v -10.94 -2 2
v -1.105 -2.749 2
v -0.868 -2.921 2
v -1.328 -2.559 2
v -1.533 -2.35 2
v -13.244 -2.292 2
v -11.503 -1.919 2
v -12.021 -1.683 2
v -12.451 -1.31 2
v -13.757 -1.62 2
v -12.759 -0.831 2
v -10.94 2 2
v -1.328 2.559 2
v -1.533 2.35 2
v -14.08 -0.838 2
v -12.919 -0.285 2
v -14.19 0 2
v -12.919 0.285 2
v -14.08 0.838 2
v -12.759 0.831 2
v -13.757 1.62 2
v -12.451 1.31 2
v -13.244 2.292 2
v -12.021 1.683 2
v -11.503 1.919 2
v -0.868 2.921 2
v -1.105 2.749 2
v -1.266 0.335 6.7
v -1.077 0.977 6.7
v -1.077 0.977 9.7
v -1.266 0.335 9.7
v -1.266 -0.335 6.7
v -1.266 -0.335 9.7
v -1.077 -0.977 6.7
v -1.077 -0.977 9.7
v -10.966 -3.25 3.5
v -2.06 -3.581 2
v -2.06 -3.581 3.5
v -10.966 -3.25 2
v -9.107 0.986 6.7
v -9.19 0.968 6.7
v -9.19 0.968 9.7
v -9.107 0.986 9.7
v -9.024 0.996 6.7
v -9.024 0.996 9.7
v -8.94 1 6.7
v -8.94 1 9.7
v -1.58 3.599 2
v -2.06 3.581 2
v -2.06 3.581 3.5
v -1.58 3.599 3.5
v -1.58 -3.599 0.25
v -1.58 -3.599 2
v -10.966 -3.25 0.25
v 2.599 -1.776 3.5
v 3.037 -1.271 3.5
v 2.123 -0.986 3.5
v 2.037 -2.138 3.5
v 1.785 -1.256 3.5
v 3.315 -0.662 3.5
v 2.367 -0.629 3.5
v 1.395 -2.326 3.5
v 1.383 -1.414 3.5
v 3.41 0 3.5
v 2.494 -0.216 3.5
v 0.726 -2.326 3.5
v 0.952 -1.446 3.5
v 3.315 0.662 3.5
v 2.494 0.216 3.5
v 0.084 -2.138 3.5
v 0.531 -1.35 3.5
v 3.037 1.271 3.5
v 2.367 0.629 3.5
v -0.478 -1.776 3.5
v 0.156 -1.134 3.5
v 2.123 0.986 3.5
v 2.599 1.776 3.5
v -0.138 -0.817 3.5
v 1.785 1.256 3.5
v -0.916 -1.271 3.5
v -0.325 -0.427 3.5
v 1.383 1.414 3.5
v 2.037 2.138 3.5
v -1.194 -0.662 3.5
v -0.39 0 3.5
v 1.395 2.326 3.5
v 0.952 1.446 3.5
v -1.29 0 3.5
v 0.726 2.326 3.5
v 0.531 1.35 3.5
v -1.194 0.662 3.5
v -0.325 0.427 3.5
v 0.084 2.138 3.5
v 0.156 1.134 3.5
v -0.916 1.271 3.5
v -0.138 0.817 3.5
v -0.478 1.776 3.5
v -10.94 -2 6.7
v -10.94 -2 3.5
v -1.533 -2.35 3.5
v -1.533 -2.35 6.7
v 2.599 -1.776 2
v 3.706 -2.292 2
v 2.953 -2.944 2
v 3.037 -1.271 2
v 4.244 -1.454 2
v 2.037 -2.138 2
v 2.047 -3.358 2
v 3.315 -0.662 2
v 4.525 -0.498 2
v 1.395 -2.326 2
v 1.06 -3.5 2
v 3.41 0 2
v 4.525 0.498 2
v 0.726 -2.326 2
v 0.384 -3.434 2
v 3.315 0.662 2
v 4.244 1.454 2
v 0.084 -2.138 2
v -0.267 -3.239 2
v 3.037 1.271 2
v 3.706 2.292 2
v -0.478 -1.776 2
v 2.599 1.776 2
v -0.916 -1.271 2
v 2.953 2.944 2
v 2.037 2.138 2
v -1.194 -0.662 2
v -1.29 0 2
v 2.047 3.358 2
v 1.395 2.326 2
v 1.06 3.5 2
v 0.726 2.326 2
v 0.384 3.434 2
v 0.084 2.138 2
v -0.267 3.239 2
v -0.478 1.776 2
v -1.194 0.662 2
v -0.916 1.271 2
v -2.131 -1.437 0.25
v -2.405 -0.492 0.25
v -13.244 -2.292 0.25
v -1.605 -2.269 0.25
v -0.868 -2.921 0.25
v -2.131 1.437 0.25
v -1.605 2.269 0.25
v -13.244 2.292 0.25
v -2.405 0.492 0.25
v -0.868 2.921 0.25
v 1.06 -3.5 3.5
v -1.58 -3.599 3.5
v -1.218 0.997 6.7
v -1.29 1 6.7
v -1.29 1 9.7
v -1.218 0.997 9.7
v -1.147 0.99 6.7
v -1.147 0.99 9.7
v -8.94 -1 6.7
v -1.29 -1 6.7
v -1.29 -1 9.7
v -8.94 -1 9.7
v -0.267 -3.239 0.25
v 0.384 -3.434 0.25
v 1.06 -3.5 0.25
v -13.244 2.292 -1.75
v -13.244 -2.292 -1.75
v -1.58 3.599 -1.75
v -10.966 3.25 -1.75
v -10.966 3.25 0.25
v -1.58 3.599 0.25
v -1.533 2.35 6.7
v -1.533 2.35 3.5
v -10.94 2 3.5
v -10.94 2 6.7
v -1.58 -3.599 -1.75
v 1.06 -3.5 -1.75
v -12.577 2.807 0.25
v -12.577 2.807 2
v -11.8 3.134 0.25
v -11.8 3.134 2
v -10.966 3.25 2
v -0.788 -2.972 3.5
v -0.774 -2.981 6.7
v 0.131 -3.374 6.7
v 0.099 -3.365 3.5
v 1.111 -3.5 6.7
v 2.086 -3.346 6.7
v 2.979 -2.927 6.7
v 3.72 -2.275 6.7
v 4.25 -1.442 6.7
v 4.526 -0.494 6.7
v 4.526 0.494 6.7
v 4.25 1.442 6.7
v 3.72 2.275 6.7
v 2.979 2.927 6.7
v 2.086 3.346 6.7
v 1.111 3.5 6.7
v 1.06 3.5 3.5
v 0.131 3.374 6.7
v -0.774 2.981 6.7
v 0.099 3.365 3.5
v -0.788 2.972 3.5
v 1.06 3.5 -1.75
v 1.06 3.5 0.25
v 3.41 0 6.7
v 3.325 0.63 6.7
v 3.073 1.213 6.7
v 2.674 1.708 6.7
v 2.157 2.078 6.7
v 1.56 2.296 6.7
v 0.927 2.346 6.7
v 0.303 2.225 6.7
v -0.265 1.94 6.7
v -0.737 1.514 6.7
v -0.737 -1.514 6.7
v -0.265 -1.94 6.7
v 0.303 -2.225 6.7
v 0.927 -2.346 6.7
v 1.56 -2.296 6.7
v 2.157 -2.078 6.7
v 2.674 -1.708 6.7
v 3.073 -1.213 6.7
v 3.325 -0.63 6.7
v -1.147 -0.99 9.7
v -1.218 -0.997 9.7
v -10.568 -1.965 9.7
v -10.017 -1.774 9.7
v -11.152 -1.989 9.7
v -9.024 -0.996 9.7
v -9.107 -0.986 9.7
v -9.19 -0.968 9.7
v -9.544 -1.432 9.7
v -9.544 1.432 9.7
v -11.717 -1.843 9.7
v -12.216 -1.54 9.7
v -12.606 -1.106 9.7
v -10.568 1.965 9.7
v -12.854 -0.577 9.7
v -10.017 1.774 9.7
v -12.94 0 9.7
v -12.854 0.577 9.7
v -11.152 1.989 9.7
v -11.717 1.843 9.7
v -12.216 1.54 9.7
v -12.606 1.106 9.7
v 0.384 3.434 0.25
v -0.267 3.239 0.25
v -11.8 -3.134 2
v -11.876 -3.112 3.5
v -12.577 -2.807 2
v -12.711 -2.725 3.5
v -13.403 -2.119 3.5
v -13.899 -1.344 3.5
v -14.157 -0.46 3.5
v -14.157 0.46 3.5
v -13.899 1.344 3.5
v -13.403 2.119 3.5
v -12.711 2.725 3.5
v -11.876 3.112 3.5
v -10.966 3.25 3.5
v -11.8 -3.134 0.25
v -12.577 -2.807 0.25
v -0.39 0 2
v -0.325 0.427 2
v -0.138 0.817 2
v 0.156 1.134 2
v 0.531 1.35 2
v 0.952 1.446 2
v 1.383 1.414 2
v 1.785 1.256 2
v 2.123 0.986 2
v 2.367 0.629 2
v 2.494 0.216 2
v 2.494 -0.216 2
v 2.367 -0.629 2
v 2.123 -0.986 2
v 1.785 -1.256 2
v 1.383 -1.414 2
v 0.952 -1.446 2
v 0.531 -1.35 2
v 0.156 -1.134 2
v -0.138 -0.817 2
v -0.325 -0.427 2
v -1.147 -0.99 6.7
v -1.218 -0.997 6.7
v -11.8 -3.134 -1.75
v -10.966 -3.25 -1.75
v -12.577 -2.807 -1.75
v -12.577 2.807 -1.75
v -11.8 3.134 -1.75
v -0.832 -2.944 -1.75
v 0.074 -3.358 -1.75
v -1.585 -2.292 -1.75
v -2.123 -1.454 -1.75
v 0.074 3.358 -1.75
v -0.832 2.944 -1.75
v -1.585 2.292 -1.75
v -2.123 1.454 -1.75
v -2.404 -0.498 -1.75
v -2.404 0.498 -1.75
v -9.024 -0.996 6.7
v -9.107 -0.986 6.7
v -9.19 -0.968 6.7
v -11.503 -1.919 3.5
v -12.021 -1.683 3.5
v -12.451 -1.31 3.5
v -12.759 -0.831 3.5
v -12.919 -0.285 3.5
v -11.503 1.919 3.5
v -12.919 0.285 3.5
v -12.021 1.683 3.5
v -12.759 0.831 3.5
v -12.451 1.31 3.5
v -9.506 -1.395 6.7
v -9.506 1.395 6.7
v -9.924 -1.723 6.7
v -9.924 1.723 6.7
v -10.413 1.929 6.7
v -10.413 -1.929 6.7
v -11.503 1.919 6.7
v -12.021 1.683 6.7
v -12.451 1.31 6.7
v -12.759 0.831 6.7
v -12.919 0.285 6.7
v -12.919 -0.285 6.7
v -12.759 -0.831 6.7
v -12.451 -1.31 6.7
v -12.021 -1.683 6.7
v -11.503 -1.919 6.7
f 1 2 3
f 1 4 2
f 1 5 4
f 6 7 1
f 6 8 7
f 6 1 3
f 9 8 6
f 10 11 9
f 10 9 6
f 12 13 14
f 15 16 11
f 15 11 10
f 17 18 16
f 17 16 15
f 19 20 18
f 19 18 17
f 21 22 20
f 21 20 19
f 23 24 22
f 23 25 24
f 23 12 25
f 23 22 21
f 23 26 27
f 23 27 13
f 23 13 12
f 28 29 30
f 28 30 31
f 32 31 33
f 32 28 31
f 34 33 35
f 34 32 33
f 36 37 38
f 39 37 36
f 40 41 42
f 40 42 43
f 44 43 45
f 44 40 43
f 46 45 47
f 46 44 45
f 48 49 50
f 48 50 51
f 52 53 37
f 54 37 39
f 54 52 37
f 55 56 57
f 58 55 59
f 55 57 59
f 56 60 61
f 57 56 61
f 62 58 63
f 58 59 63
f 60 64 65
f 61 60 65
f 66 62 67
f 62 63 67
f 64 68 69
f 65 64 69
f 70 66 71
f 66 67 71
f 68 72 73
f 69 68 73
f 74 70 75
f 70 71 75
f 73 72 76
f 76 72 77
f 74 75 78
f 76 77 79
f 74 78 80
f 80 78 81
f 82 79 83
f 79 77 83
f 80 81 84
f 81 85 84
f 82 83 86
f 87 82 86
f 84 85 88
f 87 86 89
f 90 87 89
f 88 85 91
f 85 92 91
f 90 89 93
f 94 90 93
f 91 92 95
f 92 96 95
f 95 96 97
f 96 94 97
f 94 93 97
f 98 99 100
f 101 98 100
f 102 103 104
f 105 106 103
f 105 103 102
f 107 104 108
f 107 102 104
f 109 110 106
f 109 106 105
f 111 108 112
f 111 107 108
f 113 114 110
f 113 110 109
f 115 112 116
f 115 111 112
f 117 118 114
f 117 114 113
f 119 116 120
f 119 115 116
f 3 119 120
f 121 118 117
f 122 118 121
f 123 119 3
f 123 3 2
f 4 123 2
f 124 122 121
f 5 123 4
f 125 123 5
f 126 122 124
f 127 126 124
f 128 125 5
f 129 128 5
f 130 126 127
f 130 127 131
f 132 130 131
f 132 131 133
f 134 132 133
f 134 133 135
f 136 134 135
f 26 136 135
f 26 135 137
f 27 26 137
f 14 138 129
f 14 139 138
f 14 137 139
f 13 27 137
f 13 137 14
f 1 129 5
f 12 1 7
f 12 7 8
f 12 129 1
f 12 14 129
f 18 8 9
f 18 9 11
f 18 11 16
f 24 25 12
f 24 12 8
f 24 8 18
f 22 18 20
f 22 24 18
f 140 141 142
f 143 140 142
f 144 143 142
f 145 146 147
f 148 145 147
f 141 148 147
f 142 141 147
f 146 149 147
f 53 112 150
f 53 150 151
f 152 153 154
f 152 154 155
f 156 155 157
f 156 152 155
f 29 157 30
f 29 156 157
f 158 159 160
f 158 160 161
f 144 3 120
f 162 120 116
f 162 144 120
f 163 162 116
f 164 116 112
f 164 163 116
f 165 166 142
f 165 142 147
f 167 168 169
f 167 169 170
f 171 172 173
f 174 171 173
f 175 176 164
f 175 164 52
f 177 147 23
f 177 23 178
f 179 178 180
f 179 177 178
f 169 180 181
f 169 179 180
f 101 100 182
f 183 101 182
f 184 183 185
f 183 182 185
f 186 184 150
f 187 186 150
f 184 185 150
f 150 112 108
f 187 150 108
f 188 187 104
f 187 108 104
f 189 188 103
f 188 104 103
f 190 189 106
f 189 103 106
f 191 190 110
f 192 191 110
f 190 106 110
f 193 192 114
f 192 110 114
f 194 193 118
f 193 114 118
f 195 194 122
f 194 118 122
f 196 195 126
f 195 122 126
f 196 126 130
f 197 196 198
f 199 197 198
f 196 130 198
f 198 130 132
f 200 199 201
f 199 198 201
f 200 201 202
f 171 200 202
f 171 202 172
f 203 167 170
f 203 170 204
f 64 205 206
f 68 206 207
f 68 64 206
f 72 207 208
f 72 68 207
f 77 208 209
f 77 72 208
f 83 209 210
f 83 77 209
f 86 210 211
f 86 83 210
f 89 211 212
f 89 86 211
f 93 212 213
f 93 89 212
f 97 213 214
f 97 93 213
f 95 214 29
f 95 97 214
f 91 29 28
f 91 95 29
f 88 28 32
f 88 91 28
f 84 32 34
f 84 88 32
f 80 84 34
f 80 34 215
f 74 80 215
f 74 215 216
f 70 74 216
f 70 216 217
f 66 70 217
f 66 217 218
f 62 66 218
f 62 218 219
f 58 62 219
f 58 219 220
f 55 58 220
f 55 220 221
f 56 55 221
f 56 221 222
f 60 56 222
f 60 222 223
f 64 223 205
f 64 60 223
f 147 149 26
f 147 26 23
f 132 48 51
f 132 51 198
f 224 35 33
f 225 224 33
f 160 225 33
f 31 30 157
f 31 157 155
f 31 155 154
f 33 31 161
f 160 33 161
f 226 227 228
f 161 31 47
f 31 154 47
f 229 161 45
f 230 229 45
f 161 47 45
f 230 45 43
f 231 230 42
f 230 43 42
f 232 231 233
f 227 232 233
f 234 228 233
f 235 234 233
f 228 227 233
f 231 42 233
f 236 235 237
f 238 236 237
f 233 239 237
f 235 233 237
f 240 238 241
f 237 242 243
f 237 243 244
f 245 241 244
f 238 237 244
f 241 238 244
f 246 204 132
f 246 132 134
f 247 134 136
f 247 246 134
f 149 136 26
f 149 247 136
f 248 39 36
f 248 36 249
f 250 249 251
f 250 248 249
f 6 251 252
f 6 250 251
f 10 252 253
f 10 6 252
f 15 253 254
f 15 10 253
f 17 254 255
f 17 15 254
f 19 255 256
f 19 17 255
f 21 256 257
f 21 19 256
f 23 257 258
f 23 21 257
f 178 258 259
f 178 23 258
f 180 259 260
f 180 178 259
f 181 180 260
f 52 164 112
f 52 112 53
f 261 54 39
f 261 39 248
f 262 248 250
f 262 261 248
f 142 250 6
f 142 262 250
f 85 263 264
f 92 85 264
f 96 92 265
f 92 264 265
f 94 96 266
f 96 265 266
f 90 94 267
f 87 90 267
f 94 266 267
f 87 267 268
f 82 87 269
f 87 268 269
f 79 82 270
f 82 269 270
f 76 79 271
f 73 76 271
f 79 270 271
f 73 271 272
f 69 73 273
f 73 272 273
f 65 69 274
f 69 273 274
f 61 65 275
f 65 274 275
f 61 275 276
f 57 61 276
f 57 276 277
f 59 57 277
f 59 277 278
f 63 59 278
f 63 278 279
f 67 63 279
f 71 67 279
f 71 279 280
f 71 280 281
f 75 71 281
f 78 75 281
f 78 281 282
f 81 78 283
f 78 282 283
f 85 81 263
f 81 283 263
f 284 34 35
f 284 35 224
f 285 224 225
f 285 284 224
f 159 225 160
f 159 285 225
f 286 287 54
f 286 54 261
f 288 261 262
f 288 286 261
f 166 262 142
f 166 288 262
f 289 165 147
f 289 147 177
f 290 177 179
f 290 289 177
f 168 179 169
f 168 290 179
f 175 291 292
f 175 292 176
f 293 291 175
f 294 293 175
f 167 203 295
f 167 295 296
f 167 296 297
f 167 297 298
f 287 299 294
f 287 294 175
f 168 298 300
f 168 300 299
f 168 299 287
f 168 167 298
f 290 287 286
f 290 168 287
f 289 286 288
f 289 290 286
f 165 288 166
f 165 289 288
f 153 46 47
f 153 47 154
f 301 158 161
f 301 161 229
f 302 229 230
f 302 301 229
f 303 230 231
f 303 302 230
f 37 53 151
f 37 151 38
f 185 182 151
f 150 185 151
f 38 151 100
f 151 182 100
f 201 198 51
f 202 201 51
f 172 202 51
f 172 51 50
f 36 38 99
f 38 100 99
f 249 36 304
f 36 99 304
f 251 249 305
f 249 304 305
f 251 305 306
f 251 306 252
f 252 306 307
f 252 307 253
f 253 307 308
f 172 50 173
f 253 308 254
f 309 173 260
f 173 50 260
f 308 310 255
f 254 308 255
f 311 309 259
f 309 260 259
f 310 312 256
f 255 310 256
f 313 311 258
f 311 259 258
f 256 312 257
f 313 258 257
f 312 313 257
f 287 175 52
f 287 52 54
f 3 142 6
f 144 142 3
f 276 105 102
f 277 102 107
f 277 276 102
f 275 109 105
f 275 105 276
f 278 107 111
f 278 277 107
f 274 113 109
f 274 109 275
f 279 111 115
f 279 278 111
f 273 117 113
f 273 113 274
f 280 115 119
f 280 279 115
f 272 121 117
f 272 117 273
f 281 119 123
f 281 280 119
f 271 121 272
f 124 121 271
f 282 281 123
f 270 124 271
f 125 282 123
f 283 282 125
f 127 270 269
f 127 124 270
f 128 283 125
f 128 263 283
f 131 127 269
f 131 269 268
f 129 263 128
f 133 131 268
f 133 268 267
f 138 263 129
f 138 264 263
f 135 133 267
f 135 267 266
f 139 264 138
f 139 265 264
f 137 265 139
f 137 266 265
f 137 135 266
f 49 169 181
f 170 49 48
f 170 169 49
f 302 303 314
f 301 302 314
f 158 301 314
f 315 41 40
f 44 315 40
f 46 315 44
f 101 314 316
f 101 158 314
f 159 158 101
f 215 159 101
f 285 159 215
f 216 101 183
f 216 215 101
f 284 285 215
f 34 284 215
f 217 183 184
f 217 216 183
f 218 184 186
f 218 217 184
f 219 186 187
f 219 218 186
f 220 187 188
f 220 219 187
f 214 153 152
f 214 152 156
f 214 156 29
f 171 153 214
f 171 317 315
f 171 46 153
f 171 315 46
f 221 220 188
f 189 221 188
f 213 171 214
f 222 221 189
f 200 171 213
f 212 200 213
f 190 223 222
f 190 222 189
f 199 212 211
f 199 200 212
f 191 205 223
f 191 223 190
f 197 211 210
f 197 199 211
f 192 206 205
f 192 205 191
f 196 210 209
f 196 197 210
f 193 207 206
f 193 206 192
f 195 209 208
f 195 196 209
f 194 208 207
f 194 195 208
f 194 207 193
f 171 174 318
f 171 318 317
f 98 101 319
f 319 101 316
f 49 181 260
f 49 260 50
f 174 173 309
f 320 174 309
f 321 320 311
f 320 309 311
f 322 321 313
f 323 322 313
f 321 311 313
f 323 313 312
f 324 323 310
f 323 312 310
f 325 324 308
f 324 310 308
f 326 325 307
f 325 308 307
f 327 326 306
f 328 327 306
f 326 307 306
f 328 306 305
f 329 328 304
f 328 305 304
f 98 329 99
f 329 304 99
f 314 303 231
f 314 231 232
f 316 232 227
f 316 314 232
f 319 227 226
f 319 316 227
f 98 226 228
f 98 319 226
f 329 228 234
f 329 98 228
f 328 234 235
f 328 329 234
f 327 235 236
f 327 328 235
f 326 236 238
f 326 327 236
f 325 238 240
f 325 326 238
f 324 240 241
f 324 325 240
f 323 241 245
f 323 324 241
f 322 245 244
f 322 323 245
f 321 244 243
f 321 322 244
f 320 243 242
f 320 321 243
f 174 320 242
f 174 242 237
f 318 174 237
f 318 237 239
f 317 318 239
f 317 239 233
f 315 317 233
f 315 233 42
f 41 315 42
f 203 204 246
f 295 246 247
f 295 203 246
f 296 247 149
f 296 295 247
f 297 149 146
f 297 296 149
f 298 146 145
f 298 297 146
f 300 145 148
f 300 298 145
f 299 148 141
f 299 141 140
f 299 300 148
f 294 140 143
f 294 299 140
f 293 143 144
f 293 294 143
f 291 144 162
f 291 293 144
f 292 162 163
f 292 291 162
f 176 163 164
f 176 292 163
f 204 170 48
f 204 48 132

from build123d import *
from build123d.topology import SkipClean

# Parameters (mm, degrees)
SKETCH1_R           = 2.35
BOSS_EXTRUDE1_DEPTH = 6.7
BOSS_EXTRUDE2_DEPTH = 3
CUT_EXTRUDE1_DEPTH  = 2
SKETCH4_R           = 2.35
SKETCH4_R_2         = 1.45
BOSS_EXTRUDE3_DEPTH = 1.5
BOSS_EXTRUDE4_DEPTH = 1.5
BOSS_EXTRUDE5_START = 1.75
BOSS_EXTRUDE5_DEPTH = 1.75
BOSS_EXTRUDE6_START = 2
BOSS_EXTRUDE6_DEPTH = 2


with BuildPart() as part:
    # Sketch1 → Boss-Extrude1 (new body)
    with BuildSketch(Plane.XY):
        with BuildLine():
            Line((-1.533260445, 2.35), (-10.939517975, 2))
            ThreePointArc((-10.939517975, 2), (-12.939517975, 0), (-10.939517975, -2))
            Line((-10.939517975, -2), (-1.533260445, -2.35))
            ThreePointArc((-1.533260445, -2.35), (4.560482025, 0), (-1.533260445, 2.35))
        make_face()
        with Locations((1.060482025, 0)):
            Circle(SKETCH1_R, mode=Mode.SUBTRACT)
    extrude(amount=BOSS_EXTRUDE1_DEPTH)

    # Sketch2 → Boss-Extrude2 (add)
    with SkipClean():  # the faces are left unmerged after this step: merging them gives an invalid solid
        with BuildSketch(Plane.XY.offset(6.7)):
            with BuildLine():
                Line((-8.939517975, 1), (-1.289517975, 1))
                ThreePointArc((-1.289517975, 1), (-1.18252076, 0.99425932), (-1.076752018, 0.977103192))
                ThreePointArc((-1.076752018, 0.977103192), (-1.289517975, 0), (-1.076752018, -0.977103192))
                ThreePointArc((-1.076752018, -0.977103192), (-1.18252076, -0.99425932), (-1.289517975, -1))
                Line((-1.289517975, -1), (-8.939517975, -1))
                ThreePointArc((-8.939517975, -1), (-9.065522268, -0.992029696), (-9.189517975, -0.968245837))
                ThreePointArc((-9.189517975, -0.968245837), (-12.939517975, 0), (-9.189517975, 0.968245837))
                ThreePointArc((-9.189517975, 0.968245837), (-9.065522268, 0.992029696), (-8.939517975, 1))
            make_face()
        extrude(amount=BOSS_EXTRUDE2_DEPTH)

    # Sketch3 → Cut-Extrude1 (cut)
    with SkipClean():  # the faces are left unmerged after this step: merging them gives an invalid solid
        with BuildSketch(Plane(origin=(0, 0, 0), x_dir=(-1, 0, 0), z_dir=(0, 0, -1))):
            with BuildLine():
                Line((10.939517975, 2), (1.533260445, 2.35))
                ThreePointArc((1.533260445, 2.35), (-4.560482025, 0), (1.533260445, -2.35))
                Line((1.533260445, -2.35), (10.939517975, -2))
                ThreePointArc((10.939517975, -2), (12.939517975, 0), (10.939517975, 2))
            make_face()
        extrude(amount=-CUT_EXTRUDE1_DEPTH, mode=Mode.SUBTRACT)

    # Sketch4 → Boss-Extrude3 (add)
    with SkipClean():  # the faces are left unmerged after this step: merging them gives an invalid solid
        with BuildSketch(Plane(origin=(0, 0, 2), x_dir=(-1, 0, 0), z_dir=(0, 0, -1))):
            with Locations((-1.060482025, 0)):
                Circle(SKETCH4_R)
            with Locations((-1.060482025, 0)):
                Circle(SKETCH4_R_2, mode=Mode.SUBTRACT)
        extrude(amount=-BOSS_EXTRUDE3_DEPTH)

    # Sketch5 → Boss-Extrude4 (add)
    with SkipClean():  # the faces are left unmerged after this step: merging them gives an invalid solid
        with BuildSketch(Plane(origin=(0, 0, 2), x_dir=(-1, 0, 0), z_dir=(0, 0, -1))):
            with BuildLine():
                Line((-1.060482025, -3.5), (1.579739871, -3.599135566))
                Line((1.579739871, -3.599135566), (2.059938037, -3.581267742))
                Line((2.059938037, -3.581267742), (10.965572511, -3.249895562))
                ThreePointArc((10.965572511, -3.249895562), (14.189517975, 0), (10.965572511, 3.249895562))
                Line((10.965572511, 3.249895562), (2.059938037, 3.581267742))
                Line((2.059938037, 3.581267742), (1.579739871, 3.599135566))
                Line((1.579739871, 3.599135566), (-1.060482025, 3.5))
                ThreePointArc((-1.060482025, 3.5), (0.358144071, 3.199609351), (1.533260445, 2.35))
                Line((1.533260445, 2.35), (10.939517975, 2))
                ThreePointArc((10.939517975, 2), (12.939517975, 0), (10.939517975, -2))
                Line((10.939517975, -2), (1.533260445, -2.35))
                ThreePointArc((1.533260445, -2.35), (0.358144071, -3.199609351), (-1.060482025, -3.5))
            make_face()
        extrude(amount=-BOSS_EXTRUDE4_DEPTH)

    # Sketch7 → Boss-Extrude5 (add)
    with SkipClean():  # the faces are left unmerged after this step: merging them gives an invalid solid
        with BuildSketch(Plane(origin=(0, 0, 2), x_dir=(-1, 0, 0), z_dir=(0, 0, -1)).offset(BOSS_EXTRUDE5_START)):
            with BuildLine():
                ThreePointArc((10.965572511, -3.249895562), (12.19945489, -2.995840278), (13.244032441, -2.291661642))
                Line((13.244032441, -2.291661642), (0.86770197, -2.920976974))
                ThreePointArc((0.86770197, -2.920976974), (-0.05385881, -3.35212018), (-1.060482025, -3.5))
                Line((-1.060482025, -3.5), (1.579739871, -3.599135566))
                Line((1.579739871, -3.599135566), (10.965572511, -3.249895562))
            make_face()
            with BuildLine():
                Line((0.86770197, 2.920976974), (13.244032441, 2.291661642))
                ThreePointArc((13.244032441, 2.291661642), (12.19945489, 2.995840278), (10.965572511, 3.249895562))
                Line((10.965572511, 3.249895562), (1.579739871, 3.599135566))
                Line((1.579739871, 3.599135566), (-1.060482025, 3.5))
                ThreePointArc((-1.060482025, 3.5), (-0.05385881, 3.35212018), (0.86770197, 2.920976974))
            make_face()
        extrude(amount=-BOSS_EXTRUDE5_DEPTH)

    # Sketch8 → Boss-Extrude6 (add)
    with SkipClean():  # the faces are left unmerged after this step: merging them gives an invalid solid
        with BuildSketch(Plane(origin=(0, 0, 0.25), x_dir=(-1, 0, 0), z_dir=(0, 0, -1)).offset(BOSS_EXTRUDE6_START)):
            with BuildLine():
                Line((10.965572511, 3.249895562), (1.579739871, 3.599135566))
                Line((1.579739871, 3.599135566), (-1.060482025, 3.5))
                ThreePointArc((-1.060482025, 3.5), (2.439517975, 0), (-1.060482025, -3.5))
                Line((-1.060482025, -3.5), (1.579739871, -3.599135566))
                Line((1.579739871, -3.599135566), (10.965572511, -3.249895562))
                ThreePointArc((10.965572511, -3.249895562), (12.19945489, -2.995840278), (13.244032441, -2.291661642))
                Line((13.244032441, -2.291661642), (13.244032441, 2.291661642))
                ThreePointArc((13.244032441, 2.291661642), (12.19945489, 2.995840278), (10.965572511, 3.249895562))
            make_face()
        extrude(amount=-BOSS_EXTRUDE6_DEPTH)


solid = part.part
